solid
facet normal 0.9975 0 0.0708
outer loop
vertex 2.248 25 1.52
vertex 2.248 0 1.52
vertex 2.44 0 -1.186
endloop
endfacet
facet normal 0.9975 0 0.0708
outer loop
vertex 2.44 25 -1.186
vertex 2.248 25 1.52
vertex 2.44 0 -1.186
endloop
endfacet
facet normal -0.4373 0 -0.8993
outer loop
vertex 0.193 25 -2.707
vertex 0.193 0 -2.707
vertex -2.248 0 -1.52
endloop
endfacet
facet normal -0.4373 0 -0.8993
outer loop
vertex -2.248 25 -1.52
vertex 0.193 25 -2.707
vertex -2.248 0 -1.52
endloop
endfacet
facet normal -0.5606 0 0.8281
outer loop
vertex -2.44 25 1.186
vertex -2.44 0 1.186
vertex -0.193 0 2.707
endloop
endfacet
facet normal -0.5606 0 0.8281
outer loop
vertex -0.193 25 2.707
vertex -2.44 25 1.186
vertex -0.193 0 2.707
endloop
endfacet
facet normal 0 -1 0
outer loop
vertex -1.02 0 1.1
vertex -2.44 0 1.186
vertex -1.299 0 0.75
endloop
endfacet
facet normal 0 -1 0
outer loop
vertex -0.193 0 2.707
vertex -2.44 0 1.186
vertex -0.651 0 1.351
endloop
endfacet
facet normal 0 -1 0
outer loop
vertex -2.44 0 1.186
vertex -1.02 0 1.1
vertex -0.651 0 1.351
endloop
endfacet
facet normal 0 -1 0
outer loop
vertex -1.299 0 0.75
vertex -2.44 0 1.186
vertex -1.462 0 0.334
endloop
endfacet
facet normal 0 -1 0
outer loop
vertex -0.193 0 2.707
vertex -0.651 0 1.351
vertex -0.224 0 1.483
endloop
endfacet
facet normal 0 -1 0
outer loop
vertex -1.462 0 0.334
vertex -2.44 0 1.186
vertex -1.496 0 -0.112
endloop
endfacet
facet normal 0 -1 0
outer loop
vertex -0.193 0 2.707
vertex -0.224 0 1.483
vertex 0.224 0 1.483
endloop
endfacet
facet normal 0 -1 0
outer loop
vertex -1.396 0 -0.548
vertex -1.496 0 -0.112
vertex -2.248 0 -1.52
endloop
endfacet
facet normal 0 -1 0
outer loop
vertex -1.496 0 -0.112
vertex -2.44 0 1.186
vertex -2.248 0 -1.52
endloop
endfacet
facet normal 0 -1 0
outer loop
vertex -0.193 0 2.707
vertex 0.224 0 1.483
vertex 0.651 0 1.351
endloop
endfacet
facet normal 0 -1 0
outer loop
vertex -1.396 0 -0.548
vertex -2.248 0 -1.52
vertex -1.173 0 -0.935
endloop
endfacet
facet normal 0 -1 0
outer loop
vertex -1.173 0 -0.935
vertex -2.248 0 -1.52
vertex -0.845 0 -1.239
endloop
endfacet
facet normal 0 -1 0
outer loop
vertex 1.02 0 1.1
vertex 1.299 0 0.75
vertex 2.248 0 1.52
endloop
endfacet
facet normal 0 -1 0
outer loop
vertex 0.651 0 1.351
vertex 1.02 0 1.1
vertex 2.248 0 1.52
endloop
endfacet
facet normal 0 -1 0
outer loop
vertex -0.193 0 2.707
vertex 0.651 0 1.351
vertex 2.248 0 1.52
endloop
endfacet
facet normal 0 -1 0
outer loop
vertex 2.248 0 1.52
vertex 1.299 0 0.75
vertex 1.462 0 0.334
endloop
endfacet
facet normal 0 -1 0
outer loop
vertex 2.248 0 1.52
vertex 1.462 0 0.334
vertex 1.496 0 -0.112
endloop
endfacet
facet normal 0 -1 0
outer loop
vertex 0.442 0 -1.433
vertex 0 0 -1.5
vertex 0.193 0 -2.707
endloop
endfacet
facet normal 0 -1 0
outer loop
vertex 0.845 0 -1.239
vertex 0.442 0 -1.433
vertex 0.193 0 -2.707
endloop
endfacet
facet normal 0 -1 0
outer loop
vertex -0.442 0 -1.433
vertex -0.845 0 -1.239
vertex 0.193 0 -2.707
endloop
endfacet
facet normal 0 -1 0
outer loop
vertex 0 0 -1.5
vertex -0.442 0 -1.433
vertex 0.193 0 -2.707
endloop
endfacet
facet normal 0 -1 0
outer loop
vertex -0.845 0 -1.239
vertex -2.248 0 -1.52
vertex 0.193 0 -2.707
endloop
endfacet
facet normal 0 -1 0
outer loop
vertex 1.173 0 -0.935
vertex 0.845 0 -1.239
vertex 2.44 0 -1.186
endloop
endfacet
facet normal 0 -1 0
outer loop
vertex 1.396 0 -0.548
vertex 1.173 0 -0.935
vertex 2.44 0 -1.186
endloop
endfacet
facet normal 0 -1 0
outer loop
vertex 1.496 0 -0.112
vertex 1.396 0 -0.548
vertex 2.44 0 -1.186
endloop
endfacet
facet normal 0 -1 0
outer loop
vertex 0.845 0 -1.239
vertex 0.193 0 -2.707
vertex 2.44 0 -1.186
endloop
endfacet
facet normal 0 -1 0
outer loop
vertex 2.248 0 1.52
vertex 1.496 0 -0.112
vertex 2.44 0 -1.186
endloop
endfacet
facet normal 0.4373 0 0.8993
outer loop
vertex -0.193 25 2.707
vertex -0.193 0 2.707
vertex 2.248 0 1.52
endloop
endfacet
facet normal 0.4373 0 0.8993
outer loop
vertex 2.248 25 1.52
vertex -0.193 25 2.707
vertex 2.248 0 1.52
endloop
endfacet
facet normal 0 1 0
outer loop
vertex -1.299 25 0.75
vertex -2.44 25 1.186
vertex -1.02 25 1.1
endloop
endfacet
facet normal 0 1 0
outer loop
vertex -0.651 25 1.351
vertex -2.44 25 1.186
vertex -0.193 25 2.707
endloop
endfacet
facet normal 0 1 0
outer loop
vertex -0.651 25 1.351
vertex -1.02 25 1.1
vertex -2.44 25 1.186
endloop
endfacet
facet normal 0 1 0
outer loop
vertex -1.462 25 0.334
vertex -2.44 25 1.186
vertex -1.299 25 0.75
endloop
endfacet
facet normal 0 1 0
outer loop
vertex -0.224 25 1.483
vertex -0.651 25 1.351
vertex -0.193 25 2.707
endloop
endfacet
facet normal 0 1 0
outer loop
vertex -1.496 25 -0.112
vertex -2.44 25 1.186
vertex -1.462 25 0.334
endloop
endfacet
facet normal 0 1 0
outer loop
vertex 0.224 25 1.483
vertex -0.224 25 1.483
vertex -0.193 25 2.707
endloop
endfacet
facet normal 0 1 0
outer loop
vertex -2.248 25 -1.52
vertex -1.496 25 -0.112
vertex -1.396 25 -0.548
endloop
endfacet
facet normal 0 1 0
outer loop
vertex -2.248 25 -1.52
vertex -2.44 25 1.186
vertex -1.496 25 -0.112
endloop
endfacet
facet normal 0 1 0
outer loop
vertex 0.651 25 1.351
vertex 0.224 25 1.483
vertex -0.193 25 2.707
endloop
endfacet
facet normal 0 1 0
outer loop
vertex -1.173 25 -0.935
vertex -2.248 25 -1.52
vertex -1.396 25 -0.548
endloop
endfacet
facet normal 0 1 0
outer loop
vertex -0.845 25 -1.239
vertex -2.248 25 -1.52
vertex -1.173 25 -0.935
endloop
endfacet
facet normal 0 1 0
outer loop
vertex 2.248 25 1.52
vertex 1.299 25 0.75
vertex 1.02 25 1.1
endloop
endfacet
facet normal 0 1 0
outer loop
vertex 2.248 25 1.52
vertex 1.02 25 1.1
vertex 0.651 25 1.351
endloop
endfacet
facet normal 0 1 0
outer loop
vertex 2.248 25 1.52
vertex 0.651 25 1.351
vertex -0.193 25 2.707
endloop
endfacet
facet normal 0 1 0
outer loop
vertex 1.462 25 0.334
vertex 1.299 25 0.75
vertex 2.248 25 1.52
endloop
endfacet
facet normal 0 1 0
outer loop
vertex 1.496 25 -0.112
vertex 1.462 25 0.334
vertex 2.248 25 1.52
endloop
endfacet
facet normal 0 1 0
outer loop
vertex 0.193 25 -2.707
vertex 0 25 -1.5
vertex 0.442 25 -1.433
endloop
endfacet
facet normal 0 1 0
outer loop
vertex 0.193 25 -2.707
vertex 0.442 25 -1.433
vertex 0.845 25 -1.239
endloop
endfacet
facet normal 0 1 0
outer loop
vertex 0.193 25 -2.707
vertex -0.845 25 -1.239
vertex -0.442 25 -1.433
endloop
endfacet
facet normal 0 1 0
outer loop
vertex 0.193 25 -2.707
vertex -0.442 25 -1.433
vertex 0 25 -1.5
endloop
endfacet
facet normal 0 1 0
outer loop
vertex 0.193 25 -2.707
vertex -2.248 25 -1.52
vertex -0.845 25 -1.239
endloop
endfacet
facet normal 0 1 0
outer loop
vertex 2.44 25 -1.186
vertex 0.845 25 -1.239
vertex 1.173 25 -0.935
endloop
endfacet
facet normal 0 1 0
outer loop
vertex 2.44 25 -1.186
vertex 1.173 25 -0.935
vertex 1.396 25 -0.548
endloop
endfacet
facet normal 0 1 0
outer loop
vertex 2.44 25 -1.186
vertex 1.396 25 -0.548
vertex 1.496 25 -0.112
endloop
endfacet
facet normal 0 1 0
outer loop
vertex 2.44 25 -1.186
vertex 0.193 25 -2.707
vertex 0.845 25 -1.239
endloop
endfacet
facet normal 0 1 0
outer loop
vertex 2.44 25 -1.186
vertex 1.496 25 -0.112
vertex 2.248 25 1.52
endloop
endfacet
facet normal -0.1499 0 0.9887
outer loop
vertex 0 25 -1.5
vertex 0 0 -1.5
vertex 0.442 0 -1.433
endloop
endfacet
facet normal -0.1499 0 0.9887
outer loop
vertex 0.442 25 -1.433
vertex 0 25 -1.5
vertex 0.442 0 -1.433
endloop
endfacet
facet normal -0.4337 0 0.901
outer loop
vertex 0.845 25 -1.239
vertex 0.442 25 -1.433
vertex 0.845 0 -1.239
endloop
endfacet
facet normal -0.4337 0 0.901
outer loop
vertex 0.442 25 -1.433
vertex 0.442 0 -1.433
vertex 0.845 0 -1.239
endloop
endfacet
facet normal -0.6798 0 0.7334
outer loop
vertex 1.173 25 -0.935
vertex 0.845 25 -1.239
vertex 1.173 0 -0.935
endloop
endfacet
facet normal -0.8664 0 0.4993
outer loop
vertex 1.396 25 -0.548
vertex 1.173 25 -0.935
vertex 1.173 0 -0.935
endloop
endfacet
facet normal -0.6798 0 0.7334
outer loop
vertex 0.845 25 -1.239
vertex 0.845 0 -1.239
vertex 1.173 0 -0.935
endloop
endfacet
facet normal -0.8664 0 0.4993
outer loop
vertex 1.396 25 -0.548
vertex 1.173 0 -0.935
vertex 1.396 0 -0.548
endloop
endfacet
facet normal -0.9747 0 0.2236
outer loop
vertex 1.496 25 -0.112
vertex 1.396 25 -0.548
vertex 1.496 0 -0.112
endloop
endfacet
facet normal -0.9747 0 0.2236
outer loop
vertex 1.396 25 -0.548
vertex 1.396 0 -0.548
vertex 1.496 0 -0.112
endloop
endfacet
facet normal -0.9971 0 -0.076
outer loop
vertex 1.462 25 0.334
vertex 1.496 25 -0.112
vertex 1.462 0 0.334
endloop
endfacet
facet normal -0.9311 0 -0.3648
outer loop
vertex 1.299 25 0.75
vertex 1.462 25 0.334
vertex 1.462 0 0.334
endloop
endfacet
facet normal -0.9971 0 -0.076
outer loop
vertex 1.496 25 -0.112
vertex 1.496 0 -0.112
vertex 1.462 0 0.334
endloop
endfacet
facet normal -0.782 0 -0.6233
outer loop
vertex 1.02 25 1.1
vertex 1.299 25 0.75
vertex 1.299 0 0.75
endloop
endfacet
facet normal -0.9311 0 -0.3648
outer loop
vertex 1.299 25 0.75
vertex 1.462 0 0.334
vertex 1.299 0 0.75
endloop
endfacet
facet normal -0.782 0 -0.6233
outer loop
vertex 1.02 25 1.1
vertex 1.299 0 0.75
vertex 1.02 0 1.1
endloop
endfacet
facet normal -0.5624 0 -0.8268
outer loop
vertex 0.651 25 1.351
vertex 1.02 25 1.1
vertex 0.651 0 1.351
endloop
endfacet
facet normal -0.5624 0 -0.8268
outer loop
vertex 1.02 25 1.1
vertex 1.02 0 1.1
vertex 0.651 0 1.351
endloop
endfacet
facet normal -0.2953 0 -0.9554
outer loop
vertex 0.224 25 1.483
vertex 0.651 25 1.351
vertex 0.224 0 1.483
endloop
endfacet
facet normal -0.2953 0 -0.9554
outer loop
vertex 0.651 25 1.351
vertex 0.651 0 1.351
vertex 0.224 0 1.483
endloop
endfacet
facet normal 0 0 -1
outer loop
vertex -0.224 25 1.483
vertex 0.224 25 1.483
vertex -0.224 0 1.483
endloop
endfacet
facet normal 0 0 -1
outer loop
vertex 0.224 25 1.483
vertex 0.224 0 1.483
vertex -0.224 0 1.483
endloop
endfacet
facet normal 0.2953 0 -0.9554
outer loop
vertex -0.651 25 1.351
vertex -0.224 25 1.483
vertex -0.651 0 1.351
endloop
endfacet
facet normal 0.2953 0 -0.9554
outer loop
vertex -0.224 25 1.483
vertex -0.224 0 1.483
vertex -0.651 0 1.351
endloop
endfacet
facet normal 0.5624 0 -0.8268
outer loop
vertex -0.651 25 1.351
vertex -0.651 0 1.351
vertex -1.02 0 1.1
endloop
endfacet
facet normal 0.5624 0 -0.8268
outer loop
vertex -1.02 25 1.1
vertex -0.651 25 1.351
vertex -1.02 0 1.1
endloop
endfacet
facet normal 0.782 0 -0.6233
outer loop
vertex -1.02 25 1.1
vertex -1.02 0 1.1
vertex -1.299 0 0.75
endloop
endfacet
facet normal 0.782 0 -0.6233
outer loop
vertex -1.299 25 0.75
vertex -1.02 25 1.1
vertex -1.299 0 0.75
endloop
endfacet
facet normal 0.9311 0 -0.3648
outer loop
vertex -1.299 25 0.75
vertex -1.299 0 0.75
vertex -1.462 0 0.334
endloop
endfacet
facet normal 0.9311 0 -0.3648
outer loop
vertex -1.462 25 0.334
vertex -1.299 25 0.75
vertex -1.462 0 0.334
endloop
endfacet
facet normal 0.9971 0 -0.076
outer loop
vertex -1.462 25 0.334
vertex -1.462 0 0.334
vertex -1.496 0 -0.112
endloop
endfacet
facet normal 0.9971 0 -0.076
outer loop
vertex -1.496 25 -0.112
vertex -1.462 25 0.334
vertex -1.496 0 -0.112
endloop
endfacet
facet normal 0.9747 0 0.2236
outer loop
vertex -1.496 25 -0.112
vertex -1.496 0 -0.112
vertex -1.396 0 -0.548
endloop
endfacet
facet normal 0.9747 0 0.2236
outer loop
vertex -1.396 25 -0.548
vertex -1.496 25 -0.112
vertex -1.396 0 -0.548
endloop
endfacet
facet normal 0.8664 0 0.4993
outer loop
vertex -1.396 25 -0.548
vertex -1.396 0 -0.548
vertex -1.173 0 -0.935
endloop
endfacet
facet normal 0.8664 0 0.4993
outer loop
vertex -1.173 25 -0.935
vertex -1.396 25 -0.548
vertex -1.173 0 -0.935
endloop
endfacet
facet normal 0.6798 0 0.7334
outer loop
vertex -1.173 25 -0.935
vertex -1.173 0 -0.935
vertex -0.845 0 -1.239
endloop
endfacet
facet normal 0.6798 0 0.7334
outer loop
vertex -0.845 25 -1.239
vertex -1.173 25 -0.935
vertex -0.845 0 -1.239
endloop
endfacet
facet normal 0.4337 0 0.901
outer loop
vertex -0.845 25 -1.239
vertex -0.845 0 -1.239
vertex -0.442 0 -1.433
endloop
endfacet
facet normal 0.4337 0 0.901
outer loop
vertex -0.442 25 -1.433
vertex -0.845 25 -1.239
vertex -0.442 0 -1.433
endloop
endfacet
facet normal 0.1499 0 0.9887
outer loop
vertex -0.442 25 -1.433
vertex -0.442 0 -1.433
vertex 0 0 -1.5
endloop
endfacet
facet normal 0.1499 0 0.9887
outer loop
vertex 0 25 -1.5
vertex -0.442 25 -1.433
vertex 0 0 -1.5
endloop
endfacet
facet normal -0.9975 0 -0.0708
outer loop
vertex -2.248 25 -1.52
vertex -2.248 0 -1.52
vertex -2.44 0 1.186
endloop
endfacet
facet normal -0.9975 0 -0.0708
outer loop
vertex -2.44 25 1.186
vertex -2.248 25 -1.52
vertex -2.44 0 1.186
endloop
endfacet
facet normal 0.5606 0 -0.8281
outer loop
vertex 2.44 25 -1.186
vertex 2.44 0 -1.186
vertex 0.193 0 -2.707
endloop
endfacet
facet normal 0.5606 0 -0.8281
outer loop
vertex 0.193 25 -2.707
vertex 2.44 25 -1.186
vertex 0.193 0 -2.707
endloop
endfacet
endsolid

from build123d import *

# Parameters (mm, degrees)
EXTRUDE_1_DEPTH     = 25
SKETCH_2_R          = 1.5
CUT_EXTRUDE_1_DEPTH = 26.26424494


with BuildPart() as part:
    # 草图1 → 凸台-拉伸1 (new body)
    with BuildSketch(Plane(origin=(0, 0, 0), x_dir=(1, 0, 0), z_dir=(0, 1, 0))):
        Polygon((2.440476282, 1.186342637), (0.19283528, 2.706685776), (-2.247641002, 1.520343139), (-2.440476282, -1.186342637), (-0.19283528, -2.706685776), (2.247641002, -1.520343139), align=None)
    extrude(amount=EXTRUDE_1_DEPTH)

    # 草图2 → 切除-拉伸1 (cut, through all)
    with BuildSketch(Plane.XZ):
        with Locations(Location((0, 0, 0), (0, 0, 270))):
            Circle(SKETCH_2_R)
    extrude(amount=-CUT_EXTRUDE_1_DEPTH, mode=Mode.SUBTRACT)


solid = part.part
